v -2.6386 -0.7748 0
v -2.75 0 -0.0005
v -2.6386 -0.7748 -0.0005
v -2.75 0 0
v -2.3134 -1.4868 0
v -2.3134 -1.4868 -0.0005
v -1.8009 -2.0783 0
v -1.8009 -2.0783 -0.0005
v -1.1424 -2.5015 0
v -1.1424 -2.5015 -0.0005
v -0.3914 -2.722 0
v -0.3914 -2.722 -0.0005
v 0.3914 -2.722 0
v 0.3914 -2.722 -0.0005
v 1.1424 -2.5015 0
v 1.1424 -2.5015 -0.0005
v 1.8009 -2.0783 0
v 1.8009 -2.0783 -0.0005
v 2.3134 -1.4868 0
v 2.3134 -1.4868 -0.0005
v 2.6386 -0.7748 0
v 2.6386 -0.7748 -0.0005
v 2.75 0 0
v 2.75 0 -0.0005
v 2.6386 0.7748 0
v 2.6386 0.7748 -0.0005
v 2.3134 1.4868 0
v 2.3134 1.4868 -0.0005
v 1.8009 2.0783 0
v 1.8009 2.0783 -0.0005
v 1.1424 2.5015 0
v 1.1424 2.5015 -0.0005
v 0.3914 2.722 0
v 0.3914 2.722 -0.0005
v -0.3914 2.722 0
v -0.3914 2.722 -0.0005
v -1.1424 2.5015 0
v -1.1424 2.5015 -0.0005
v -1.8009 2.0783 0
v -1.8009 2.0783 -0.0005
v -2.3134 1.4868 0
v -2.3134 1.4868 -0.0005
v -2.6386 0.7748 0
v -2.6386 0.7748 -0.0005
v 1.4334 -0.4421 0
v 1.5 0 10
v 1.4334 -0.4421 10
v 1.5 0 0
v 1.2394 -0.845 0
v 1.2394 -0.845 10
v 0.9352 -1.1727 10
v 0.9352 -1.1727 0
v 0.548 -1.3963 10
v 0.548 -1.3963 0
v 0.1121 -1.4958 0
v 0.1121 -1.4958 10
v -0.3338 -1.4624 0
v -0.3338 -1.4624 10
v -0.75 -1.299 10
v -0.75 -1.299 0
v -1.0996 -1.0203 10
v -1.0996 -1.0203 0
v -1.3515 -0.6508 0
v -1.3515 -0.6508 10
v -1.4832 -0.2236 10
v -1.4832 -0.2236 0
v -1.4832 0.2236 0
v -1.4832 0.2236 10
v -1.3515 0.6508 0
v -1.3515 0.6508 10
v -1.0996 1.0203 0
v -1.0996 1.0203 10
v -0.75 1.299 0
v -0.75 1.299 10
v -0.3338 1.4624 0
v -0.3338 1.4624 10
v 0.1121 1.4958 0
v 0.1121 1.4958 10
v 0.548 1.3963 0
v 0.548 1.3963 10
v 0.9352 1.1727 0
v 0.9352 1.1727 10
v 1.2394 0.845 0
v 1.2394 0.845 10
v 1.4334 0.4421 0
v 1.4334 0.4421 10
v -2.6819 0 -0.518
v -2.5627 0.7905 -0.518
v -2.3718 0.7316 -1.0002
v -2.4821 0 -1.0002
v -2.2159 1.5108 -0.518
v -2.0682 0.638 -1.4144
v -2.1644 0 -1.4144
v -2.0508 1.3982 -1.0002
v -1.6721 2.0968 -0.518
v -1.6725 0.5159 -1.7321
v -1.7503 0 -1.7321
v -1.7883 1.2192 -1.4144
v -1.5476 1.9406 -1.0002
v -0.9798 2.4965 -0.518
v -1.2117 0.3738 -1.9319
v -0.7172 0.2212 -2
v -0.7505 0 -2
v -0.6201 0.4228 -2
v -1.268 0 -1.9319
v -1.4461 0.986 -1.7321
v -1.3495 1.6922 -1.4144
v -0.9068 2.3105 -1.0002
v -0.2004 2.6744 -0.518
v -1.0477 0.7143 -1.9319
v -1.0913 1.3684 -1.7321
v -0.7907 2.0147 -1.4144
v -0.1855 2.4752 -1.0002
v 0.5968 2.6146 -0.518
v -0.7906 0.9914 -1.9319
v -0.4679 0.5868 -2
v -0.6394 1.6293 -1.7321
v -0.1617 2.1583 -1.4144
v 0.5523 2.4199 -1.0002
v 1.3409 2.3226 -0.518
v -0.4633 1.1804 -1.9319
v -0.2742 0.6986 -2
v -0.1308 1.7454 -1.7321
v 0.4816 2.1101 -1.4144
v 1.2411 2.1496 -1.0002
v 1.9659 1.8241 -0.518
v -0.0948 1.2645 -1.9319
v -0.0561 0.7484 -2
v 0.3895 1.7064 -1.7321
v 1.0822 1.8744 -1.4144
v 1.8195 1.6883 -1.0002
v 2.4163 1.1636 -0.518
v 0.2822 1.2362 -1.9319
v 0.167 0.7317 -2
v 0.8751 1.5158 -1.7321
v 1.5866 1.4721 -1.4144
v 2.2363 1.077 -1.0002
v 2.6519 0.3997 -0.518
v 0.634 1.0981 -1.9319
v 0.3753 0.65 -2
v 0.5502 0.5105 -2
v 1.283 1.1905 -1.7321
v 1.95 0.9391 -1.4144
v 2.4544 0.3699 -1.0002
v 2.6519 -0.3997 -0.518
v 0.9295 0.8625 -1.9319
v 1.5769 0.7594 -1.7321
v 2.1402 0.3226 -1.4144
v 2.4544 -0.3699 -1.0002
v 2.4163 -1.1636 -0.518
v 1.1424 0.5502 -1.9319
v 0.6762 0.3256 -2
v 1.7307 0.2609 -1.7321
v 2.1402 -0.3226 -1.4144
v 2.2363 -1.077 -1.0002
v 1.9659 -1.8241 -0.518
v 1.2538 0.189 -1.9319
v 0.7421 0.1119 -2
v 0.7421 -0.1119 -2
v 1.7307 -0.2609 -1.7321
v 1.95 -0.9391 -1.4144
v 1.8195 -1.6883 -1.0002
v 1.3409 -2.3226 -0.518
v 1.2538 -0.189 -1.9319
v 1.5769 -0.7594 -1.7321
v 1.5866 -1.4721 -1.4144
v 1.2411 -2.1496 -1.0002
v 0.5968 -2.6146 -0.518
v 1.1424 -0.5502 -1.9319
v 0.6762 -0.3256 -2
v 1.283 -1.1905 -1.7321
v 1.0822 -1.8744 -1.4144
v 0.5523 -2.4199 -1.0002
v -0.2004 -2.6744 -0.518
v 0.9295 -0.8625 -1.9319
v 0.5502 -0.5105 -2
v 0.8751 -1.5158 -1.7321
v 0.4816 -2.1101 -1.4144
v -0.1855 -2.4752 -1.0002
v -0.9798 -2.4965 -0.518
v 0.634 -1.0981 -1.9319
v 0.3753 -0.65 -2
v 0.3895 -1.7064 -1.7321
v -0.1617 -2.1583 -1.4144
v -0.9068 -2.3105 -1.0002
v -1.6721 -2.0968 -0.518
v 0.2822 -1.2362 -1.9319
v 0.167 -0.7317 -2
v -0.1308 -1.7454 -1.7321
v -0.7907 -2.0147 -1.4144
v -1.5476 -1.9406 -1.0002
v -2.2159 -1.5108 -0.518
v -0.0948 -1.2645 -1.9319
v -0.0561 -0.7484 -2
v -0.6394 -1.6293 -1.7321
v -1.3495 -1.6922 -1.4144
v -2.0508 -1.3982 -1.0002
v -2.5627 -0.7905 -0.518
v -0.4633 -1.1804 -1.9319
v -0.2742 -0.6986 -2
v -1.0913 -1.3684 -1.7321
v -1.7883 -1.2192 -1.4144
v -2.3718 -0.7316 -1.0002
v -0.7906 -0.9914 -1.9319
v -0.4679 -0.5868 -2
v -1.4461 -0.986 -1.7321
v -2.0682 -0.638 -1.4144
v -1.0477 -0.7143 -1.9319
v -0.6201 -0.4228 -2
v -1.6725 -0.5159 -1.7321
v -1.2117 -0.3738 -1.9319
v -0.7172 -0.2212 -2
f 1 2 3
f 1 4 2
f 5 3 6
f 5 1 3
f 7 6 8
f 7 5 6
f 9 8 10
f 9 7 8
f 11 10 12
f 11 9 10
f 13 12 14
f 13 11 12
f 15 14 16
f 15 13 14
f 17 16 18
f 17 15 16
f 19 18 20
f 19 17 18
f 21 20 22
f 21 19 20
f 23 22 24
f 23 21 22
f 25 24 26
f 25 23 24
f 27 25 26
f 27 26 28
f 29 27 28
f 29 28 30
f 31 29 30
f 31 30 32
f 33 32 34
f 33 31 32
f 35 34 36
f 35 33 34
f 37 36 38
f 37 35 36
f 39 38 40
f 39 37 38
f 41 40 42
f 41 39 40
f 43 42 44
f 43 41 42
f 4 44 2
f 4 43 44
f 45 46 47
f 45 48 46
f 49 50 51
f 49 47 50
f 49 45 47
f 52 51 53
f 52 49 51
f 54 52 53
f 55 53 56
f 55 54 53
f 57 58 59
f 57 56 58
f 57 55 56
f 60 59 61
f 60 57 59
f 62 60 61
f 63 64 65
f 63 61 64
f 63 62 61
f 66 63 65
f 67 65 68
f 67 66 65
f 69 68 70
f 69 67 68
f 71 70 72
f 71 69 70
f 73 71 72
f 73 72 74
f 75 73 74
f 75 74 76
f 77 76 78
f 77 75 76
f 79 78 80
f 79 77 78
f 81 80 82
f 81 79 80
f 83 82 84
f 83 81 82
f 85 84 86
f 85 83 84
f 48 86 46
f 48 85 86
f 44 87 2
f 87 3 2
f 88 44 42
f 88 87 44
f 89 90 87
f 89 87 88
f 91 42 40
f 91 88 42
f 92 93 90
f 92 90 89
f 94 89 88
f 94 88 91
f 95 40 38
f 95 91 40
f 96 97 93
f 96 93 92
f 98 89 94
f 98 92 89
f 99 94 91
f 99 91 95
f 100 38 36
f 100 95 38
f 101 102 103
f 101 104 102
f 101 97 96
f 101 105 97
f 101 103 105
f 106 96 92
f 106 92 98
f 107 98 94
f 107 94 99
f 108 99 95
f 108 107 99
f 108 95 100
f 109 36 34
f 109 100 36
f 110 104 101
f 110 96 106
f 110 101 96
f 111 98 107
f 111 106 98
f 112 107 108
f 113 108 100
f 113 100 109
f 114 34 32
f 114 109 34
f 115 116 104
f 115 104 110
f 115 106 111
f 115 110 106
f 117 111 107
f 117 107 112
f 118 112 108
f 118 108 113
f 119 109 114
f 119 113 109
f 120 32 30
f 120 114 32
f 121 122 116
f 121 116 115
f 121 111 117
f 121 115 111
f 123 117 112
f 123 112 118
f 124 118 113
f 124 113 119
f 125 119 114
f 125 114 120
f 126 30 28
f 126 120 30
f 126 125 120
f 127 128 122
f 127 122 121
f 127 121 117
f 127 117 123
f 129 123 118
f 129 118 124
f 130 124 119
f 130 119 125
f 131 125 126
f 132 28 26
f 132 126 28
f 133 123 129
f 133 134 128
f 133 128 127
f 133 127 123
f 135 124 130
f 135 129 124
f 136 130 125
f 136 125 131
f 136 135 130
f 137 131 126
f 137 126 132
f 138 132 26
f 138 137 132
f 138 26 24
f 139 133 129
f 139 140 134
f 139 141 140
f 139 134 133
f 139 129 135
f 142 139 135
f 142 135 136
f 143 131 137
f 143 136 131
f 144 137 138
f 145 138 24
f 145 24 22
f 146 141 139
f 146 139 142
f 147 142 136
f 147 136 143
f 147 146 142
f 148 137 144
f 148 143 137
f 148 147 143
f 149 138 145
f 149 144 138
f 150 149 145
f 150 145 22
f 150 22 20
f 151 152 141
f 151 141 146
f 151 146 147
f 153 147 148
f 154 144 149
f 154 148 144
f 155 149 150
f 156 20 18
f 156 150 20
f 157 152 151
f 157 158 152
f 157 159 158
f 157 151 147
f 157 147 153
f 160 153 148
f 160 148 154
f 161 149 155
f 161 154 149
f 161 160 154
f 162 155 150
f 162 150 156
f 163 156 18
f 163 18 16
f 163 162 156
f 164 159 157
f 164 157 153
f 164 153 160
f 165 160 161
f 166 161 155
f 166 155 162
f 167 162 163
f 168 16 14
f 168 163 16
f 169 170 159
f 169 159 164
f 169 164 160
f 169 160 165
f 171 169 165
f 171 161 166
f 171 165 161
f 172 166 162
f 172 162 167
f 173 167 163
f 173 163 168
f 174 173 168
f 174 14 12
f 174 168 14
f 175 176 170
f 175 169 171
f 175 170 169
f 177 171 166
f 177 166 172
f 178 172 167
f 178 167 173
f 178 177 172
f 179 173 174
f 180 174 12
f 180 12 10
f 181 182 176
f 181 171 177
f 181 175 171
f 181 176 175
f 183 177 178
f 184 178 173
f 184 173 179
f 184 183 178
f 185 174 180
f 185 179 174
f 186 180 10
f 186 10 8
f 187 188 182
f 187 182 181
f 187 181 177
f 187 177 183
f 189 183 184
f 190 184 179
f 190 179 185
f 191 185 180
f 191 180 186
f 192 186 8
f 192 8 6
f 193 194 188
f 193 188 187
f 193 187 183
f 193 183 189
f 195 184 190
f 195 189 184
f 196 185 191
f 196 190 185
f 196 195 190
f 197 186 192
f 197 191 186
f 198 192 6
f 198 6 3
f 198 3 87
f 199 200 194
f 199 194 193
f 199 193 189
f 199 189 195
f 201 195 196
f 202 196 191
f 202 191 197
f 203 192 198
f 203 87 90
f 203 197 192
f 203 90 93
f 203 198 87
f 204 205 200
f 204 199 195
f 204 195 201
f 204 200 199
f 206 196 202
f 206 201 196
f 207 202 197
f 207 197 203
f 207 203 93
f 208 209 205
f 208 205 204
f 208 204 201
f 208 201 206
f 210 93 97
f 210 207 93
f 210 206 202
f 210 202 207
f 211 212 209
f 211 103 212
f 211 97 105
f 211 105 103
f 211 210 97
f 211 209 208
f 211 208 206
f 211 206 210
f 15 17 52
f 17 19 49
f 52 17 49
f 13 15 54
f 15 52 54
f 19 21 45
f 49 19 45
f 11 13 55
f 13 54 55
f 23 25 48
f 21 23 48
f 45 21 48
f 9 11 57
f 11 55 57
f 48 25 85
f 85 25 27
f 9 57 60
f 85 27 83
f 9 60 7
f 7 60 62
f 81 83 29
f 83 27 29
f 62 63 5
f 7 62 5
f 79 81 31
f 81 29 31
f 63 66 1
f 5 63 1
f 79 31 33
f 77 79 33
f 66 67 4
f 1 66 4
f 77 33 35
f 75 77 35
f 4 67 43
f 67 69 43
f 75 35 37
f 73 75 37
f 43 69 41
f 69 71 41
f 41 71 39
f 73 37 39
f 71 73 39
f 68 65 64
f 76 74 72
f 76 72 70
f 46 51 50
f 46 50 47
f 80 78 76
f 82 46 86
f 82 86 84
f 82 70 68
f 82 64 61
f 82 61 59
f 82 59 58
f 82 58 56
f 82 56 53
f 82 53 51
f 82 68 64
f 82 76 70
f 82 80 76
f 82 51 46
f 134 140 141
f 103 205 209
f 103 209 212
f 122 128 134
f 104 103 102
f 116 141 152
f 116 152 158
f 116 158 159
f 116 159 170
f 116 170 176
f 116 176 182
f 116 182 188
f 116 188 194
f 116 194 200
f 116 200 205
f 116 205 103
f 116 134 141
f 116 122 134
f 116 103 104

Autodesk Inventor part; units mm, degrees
ref_plane "YZ Plane" through (0, 0, 0) normal (1, 0, 0) x (0, 1, 0)
ref_plane "XZ Plane" through (0, 0, 0) normal (0, 1, 0) x (-1, 0, 0)
ref_plane "XY Plane" through (0, 0, 0) normal (0, 0, 1) x (1, 0, 0)
sketch "スケッチ1" plane through (0, 0, 0) normal (0, 0, 1) x (1, 0, 0)
  circle A0 centre (0, 0) radius 1.5
  dimension "d0" = 3
extrude "押し出し1" add sketch "スケッチ1" along normal blind 10
sketch "スケッチ2" plane through (0, 0, 0) normal (0, 0, -1) x (-1, 0, 0)
  circle A0 centre (0, 0) radius 2.75
  dimension "d3" = 5.5
extrude "押し出し2" add sketch "スケッチ2" along normal blind 2
fillet "フィレット1" radius 2 1 edges at (2.75, 0, -2)
thread "ねじ1" size "M3x0.5" class "6g" standard "ANSI Metric M Profile" full length
properties part number "ネジm3,10" material "鋼、高強度、低合金"
